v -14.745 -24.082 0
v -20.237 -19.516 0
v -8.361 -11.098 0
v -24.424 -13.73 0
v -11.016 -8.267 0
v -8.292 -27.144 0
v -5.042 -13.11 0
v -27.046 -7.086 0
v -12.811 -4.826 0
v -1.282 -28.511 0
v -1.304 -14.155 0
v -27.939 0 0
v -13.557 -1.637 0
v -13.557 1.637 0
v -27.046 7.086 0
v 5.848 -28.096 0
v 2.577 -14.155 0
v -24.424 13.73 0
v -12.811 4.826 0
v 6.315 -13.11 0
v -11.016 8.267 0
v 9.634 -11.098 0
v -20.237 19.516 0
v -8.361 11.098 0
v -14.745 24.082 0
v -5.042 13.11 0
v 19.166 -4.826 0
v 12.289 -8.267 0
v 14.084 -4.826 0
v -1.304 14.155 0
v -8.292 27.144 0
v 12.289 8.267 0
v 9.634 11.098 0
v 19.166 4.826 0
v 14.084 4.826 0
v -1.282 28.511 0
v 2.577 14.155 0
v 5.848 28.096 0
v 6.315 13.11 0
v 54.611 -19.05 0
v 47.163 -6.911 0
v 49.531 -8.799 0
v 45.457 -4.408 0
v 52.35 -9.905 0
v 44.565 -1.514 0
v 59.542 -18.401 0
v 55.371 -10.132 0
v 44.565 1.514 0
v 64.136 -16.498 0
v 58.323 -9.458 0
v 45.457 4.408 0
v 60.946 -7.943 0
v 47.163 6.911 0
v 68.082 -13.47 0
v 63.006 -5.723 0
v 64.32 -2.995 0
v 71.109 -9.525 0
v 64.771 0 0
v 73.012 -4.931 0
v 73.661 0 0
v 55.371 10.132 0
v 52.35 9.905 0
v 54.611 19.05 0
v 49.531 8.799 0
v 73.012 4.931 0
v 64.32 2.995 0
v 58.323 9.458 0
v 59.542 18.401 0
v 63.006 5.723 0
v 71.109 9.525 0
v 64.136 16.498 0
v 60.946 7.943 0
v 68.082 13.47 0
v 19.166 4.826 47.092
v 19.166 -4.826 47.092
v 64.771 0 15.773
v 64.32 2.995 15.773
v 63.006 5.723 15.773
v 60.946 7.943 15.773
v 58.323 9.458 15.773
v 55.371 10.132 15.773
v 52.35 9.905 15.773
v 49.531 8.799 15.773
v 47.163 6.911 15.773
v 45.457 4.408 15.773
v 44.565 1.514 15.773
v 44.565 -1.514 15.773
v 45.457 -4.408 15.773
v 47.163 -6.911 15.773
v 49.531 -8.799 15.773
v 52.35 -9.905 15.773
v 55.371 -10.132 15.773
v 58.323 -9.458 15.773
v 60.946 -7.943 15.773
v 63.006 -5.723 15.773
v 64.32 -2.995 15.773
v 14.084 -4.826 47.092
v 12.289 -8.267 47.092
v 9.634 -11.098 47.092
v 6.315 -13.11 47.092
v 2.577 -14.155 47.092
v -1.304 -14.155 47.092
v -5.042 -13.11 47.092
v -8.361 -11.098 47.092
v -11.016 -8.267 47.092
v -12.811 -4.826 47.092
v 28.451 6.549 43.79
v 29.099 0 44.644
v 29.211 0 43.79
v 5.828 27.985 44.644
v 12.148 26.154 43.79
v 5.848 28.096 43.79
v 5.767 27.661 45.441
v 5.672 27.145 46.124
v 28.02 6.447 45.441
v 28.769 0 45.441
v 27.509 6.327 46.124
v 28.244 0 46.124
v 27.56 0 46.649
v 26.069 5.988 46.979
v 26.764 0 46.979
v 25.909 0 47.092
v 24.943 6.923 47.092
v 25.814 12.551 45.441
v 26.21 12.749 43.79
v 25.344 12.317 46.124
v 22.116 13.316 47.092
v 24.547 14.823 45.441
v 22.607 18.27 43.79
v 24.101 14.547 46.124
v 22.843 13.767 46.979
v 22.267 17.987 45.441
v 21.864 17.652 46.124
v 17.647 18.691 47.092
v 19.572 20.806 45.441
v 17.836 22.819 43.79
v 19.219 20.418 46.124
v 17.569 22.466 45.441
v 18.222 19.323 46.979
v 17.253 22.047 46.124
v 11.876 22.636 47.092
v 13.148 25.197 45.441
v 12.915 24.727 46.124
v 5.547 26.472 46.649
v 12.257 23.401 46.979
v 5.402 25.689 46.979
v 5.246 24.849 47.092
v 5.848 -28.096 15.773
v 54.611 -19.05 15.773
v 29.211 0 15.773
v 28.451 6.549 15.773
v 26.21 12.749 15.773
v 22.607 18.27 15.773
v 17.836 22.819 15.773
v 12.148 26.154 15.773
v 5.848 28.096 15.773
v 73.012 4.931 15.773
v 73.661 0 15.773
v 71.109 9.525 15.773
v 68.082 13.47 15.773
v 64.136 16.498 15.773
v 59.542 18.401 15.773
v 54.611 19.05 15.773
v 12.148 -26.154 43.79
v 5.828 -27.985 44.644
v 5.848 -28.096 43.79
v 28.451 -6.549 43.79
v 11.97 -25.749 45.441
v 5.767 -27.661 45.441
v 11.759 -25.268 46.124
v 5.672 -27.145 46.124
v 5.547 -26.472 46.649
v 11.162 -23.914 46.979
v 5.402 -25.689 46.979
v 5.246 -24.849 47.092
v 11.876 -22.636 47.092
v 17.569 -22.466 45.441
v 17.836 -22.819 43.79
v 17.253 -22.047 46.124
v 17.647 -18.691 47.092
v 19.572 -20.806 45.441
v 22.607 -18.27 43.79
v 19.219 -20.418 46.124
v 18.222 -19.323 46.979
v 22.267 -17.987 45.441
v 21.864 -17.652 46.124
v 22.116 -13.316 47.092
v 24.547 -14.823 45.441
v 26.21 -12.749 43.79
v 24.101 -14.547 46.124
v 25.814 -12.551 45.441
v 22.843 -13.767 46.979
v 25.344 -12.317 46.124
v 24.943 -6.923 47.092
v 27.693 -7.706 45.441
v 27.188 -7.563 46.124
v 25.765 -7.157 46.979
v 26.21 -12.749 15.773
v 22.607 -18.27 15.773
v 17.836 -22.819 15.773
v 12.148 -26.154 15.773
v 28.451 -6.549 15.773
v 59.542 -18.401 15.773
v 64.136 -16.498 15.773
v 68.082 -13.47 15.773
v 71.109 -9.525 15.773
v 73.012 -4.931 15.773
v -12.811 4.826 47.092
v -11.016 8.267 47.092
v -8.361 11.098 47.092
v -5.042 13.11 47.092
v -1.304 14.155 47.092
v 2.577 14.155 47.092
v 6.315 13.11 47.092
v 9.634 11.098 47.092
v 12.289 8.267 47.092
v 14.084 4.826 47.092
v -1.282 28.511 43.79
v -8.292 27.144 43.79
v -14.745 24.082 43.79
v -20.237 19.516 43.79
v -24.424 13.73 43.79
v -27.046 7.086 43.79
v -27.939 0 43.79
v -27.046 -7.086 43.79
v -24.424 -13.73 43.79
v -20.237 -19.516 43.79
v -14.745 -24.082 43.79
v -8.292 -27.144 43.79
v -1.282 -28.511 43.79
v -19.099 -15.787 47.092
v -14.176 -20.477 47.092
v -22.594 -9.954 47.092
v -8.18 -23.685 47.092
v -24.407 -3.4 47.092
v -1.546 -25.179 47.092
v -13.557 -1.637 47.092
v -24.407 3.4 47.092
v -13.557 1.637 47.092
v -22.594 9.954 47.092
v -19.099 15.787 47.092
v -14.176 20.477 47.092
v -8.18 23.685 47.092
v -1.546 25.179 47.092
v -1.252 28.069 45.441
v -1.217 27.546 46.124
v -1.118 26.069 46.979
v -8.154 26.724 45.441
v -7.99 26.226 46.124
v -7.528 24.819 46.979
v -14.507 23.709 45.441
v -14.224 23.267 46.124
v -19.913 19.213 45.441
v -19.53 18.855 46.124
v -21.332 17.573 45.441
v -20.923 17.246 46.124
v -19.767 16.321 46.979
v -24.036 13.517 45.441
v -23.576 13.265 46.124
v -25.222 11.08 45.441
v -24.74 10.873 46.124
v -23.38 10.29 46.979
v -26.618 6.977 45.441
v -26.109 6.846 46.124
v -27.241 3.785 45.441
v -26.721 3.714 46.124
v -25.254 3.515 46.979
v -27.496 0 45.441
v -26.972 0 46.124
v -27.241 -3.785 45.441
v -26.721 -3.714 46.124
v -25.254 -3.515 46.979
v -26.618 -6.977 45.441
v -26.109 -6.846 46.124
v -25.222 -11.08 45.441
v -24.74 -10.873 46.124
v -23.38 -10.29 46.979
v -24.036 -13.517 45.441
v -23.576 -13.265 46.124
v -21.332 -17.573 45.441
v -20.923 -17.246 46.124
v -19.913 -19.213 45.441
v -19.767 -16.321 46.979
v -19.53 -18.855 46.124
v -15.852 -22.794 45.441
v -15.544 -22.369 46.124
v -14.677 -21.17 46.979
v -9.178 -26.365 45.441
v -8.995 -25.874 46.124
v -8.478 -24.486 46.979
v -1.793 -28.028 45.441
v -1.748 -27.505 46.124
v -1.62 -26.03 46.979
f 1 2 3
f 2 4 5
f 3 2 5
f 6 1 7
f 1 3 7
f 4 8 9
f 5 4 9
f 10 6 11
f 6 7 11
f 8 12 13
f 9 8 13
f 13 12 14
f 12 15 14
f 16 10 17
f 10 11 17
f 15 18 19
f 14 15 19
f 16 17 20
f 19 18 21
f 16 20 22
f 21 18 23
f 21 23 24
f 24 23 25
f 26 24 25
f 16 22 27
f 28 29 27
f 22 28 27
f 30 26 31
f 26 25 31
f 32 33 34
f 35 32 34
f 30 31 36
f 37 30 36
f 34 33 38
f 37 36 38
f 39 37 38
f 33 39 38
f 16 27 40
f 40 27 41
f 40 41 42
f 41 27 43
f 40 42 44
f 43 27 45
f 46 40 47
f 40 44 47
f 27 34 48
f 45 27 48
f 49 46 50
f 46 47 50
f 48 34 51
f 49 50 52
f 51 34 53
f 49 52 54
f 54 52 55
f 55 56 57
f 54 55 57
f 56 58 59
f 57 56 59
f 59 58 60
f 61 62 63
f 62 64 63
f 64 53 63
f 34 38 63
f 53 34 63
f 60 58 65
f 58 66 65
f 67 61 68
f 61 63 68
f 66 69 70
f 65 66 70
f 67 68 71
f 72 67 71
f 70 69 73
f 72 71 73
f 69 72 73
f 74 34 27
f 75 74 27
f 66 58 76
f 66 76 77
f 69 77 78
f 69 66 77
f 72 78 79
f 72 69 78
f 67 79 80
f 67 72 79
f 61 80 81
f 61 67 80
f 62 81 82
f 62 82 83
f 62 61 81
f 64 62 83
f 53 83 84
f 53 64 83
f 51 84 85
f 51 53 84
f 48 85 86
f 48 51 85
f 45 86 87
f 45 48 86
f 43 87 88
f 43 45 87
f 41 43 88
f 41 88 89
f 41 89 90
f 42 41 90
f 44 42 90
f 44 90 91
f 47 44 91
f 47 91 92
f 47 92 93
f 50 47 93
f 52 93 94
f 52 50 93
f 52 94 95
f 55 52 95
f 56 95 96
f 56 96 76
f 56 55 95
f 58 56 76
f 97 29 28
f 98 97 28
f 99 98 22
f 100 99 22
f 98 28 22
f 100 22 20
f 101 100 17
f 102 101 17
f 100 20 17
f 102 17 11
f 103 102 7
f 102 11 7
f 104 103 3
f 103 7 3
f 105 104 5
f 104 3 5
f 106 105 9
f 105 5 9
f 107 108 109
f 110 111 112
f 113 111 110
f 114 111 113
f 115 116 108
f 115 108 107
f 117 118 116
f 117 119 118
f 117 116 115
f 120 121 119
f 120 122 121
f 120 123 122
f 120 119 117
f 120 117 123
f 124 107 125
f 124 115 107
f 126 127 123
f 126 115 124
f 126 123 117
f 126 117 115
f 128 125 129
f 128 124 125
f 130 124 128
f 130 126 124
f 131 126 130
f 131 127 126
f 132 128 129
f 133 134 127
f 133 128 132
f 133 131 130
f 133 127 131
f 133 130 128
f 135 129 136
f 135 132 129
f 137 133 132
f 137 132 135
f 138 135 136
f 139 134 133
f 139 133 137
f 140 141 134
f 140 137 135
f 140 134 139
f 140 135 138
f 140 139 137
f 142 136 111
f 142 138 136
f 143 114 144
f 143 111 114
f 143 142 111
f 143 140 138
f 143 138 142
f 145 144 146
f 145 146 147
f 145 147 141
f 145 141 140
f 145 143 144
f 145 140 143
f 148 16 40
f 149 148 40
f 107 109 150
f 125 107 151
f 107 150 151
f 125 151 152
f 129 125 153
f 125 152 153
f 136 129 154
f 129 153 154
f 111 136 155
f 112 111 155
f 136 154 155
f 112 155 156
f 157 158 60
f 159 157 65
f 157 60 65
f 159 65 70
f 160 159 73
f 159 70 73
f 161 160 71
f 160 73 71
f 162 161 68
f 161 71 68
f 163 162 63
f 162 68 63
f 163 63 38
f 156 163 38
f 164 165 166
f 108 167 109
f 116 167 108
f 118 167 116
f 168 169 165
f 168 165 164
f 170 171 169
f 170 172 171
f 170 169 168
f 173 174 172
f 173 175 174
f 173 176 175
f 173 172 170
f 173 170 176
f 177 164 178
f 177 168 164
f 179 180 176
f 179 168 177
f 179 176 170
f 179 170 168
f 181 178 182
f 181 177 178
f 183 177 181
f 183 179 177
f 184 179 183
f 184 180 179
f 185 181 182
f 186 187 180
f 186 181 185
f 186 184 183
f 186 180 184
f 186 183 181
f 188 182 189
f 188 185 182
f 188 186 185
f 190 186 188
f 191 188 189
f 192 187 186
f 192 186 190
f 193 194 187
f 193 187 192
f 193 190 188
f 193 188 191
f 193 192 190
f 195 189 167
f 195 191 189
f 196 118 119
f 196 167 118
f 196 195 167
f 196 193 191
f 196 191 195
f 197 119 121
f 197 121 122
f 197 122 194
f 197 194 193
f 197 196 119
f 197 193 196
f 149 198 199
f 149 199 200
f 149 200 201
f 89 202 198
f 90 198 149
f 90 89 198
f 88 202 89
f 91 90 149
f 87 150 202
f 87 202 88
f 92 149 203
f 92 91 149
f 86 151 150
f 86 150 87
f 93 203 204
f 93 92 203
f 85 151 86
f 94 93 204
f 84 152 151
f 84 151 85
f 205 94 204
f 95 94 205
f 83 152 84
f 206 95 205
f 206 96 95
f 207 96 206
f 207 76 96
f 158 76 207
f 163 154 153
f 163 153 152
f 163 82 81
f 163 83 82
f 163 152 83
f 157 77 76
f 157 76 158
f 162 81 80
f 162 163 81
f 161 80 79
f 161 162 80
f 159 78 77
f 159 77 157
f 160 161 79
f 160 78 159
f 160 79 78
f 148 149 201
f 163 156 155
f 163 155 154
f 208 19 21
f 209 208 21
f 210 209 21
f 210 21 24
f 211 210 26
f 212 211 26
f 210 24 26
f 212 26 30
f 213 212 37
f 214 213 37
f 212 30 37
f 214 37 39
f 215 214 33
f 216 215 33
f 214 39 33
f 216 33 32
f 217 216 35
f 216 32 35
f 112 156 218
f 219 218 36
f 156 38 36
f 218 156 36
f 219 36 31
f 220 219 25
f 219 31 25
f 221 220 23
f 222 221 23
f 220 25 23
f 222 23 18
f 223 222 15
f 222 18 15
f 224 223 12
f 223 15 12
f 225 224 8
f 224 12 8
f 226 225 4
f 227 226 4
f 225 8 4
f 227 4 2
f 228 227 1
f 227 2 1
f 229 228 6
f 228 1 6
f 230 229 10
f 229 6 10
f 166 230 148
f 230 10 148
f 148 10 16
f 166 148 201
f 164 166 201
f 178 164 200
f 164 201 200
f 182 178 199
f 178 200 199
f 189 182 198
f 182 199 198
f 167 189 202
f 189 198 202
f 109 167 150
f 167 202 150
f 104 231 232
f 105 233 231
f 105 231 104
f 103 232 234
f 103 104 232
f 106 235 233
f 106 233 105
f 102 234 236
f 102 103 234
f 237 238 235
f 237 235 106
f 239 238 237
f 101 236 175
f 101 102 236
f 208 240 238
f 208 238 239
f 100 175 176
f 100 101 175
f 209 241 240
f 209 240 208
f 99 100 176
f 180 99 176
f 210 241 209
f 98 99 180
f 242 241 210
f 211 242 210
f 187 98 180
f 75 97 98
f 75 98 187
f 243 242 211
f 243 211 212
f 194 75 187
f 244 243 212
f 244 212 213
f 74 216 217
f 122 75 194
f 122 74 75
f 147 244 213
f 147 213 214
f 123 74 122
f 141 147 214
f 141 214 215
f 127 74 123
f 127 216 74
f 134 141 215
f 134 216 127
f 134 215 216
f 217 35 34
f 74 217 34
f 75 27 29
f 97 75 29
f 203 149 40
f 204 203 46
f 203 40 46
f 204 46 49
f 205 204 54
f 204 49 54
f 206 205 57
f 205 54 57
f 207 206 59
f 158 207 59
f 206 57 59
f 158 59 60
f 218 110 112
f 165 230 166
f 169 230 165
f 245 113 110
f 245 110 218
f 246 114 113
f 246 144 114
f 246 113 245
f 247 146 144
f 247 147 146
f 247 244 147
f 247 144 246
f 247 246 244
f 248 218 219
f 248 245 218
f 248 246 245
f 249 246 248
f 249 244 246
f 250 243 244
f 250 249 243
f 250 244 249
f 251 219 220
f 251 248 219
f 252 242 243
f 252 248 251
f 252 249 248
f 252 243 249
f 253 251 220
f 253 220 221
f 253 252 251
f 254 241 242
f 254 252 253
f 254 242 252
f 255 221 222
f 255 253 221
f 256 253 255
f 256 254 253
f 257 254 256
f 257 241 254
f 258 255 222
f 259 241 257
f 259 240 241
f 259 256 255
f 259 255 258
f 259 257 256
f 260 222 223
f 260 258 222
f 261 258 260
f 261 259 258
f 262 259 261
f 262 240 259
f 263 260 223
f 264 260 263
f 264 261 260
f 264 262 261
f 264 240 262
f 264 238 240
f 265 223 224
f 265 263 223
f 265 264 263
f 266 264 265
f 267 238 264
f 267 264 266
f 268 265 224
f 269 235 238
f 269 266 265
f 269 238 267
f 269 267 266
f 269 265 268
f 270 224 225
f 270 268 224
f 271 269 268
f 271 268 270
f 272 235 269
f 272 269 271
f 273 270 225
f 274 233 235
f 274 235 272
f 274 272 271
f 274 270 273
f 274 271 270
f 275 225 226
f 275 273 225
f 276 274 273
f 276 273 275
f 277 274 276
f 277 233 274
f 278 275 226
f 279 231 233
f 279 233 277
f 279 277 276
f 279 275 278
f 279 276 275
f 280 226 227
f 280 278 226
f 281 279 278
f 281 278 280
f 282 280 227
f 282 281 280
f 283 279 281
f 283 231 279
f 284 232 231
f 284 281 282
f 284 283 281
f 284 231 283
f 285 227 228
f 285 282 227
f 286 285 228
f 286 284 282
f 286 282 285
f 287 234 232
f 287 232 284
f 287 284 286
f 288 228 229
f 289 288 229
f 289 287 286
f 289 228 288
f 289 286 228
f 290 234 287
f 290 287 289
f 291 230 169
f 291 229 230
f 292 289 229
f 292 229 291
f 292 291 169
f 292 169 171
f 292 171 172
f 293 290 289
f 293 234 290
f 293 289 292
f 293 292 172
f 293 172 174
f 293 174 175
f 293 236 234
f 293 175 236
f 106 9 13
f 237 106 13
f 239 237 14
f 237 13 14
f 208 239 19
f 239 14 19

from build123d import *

# Parameters (mm, degrees)
F1_DEPTH = 47.0916
F0_R     = 10.16
F2_DEPTH = 15.7734
F3_R     = 3.302


with BuildPart() as f1:
    # F0 (on Top) → F1 (new body)
    with BuildSketch(Plane.XY):
        with BuildLine():
            ThreePointArc((5.848104, -28.095686), (22.607385, -18.270235), (29.211287, 0))
            ThreePointArc((29.211287, 0), (22.607385, 18.270235), (5.848103, 28.095686))
            ThreePointArc((5.848103, 28.095686), (-27.938713, 0), (5.848104, -28.095686))
        make_face()
        with BuildLine():
            ThreePointArc((-12.811478, 4.826), (0.636287, 14.2875), (14.084052, 4.826))
            Line((14.084052, 4.826), (19.165587, 4.826))
            Line((19.165587, 4.826), (19.165587, -4.826))
            Line((19.165587, -4.826), (14.084052, -4.826))
            ThreePointArc((14.084052, -4.826), (0.636287, -14.2875), (-12.811478, -4.826))
            Line((-12.811478, -4.826), (-19.165587, -4.826))
            Line((-19.165587, -4.826), (-19.165587, 4.826))
            Line((-19.165587, 4.826), (-12.811478, 4.826))
        make_face(mode=Mode.SUBTRACT)
        with BuildLine():
            ThreePointArc((-12.811478, -4.826), (-13.651213, 0), (-12.811478, 4.826))
            Line((-12.811478, 4.826), (-19.165587, 4.826))
            Line((-19.165587, 4.826), (-19.165587, -4.826))
            Line((-19.165587, -4.826), (-12.811478, -4.826))
        make_face()
    extrude(amount=F1_DEPTH)

    # F0 (on Top) → F2 (join)
    with BuildSketch(Plane.XY):
        with BuildLine():
            ThreePointArc((5.848103, 28.095686), (22.607385, 18.270235), (29.211287, 0))
            ThreePointArc((29.211287, 0), (22.607385, -18.270235), (5.848104, -28.095686))
            Line((5.848104, -28.095686), (54.611287, -19.05))
            ThreePointArc((54.611287, -19.05), (68.081671, -13.470384), (73.661287, 0))
            ThreePointArc((73.661287, 0), (68.081671, 13.470384), (54.611287, 19.05))
            Line((54.611287, 19.05), (5.848103, 28.095686))
        make_face()
        with Locations((54.611287, 0)):
            Circle(F0_R, mode=Mode.SUBTRACT)
    extrude(amount=F2_DEPTH)

    # F3
    f3_edges = [f1.edges().sort_by_distance(p)[0] for p in [
        (-4.57553, 28.095686, 47.0916),
    ]]
    fillet(f3_edges, radius=F3_R)


solid = f1.part
